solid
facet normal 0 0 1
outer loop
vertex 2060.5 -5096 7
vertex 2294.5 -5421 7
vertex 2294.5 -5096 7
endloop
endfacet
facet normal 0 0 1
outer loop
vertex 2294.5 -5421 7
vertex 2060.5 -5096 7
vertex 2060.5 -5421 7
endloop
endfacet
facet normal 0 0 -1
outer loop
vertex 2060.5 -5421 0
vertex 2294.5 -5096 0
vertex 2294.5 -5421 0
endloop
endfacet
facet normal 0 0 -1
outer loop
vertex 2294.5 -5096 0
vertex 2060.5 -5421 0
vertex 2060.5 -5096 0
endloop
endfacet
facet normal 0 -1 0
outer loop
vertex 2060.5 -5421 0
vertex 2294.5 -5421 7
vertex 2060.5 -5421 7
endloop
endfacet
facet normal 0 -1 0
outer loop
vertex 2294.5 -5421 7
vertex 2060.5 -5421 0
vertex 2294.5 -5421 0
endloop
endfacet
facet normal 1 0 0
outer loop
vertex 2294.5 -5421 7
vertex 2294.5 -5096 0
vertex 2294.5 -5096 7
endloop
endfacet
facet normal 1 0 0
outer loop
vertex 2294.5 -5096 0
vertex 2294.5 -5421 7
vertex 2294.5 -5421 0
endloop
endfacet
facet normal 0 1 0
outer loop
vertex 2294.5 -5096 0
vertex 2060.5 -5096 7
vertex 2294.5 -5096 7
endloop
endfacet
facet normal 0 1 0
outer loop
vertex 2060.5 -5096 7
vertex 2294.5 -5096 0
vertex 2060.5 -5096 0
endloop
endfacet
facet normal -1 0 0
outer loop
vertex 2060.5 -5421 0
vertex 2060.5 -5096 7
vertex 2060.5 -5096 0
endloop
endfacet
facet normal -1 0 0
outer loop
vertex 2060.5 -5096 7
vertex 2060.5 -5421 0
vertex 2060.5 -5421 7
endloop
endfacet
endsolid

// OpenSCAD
// Generated by SolidPython 1.1.1 on 2021-11-01 23:16:37
$fn = 25;


color(alpha = 1.0000000000, c = [0.5000000000, 0.5000000000, 0.6000000000]) {
	translate(v = [2060.5000000000, -5421.0000000000, 0]) {
		cube(size = [234.0000000000, 325.0000000000, 7]);
	}
}
/***********************************************
*********      SolidPython code:      **********
************************************************
 
# SolidPython example code 
# Brygg Ullmer, Clemson University
# Written 2021-10-27

from solid import *        # load in SolidPython/SCAD support code
import csv
from mcmBolts import *

scPopCoordFn = 'sc-pop-coord.csv'; scPCF = open(scPopCoordFn, "r")
scpcReader   = csv.reader(scPCF, delimiter=",")

hlCities = ['Clemson', 'Greenville', 'Columbia', 'Charleston', 'Hartsville', 'Travelers Rest'] #highlight cities

#minMaxLatLong = [32.1632, 35.156486, -78.67792, -83.110782]
#minMaxLatLong = [32.0632, 35.256486, -78.77792, -83.010782]
#minMaxLatLong = [31.5, 35.8, -79, -84]
#minMaxLatLong = [31.5, 35.5, -79., -84.]
minMaxLatLong = [31.9, 35.5, -78.5, -83.5]

############### buildGroundPlane ###############

def buildGroundPlane(multiplier):
  global minMaxLatLong 
  minlat, maxlat, minlong, maxlong = minMaxLatLong 

  difflat  = abs(maxlat - minlat)
  difflong = abs(maxlong - minlong)

  difflat2  = difflat  * multiplier
  difflong2 = difflong * multiplier

  cx = (minlong + maxlong)/2 * multiplier 
  cy = (minlat + maxlat)/2 * multiplier 

  #print(difflat2, difflong2, cx - difflat2/2, cy)

  c1 = cube([difflat2, difflong2, 7])
  c2 = translate([cy-difflong2/2.5, cx-difflat2/1.5, 0])(c1)
  c3 = color([.5,.5,.6])(c2)
  return c3

############### map pop 2 bolt ###############

#boltPopHash  = boltPopHashY = {0: 'n0', 30000: 'n0', 75000: 'n4', 200000: 'n1_4'}
boltPopHash  = boltPopHashY = {0: 'n0', 20000: 'n0', 30000: 'n2', 75000: 'n4', 200000: 'n1_4'}

def mapPop2Bolt(popStr, boltObj, boltPopHash):
  global   boltSpec
  try:     pop = int(popStr)
  except:  return 1

  popThresh = boltPopHash.keys()
  idx = 0
  for testPop in popThresh:
    if pop > testPop: idx += 1
    else:             
      key = list(popThresh)[idx]
      boltSpec = boltPopHash[key]
      #print("bs1:", boltSpec)
      return boltObj.synthBoltNeutral(boltSpec)
  lpt = len(popThresh)
  if idx >=lpt: idx = lpt-1
  try:
    key = list(popThresh)[idx]
    boltSpec = boltPopHash[key]
    #print("bs2:", boltSpec)
    return boltObj.synthBoltNeutral(boltSpec)
  except: return -1

############### main ###############

multiplier = 65.

boltObj = mcmBolts()
outGeom = buildGroundPlane(multiplier)

minlat, maxlat, minlong, maxlong = [None, None, None, None]

for row in scpcReader:
  city, popStr, lat, long = row
  bolt1 = mapPop2Bolt(popStr, boltObj, boltPopHash)

  #if city=="Columbia": print(city, bolt1)
  if isinstance(bolt1, int): continue #ignore errors

  if city in hlCities and boltSpec == 'n0': bolt1 = mapPop2Bolt(30000, boltObj, boltPopHash)

  if boltSpec == 'n0': bolt2 = translate([0,0,3])(rotate([0,-90,0])(bolt1))
  else:                bolt2 = rotate([180,0,0])(bolt1)
  if boltSpec == 'n1_4': print(city)

  #if minlat == None or lat < minlat: minlat = lat
  #if maxlat == None or lat > maxlat: maxlat = lat

  #if minlong == None or long < minlong: minlong = long
  #if maxlong == None or long > maxlong: maxlong = long

  coord = [float(lat)*multiplier, float(long)*multiplier, 0]
  #print("coord:", coord, str(bolt))
  y2 = translate(coord)(bolt2)
  #print(city, y2)

  if outGeom == None:    outGeom = y2
  #elif city in hlCities: break; outGeom += color([1,.5,0])(y2)
  elif city in hlCities: outGeom += color([1,.5,0])(y2)
  else:                  break; outGeom += y2

radialSegments = 25; hdr = '$fn = %s;' % radialSegments # create a header for the export

#print(minlat, maxlat, minlong, maxlong)

scad_render_to_file(outGeom, 'scNodes8b.scad', file_header=hdr) # write the .scad file

### end ###

 
 
************************************************/
